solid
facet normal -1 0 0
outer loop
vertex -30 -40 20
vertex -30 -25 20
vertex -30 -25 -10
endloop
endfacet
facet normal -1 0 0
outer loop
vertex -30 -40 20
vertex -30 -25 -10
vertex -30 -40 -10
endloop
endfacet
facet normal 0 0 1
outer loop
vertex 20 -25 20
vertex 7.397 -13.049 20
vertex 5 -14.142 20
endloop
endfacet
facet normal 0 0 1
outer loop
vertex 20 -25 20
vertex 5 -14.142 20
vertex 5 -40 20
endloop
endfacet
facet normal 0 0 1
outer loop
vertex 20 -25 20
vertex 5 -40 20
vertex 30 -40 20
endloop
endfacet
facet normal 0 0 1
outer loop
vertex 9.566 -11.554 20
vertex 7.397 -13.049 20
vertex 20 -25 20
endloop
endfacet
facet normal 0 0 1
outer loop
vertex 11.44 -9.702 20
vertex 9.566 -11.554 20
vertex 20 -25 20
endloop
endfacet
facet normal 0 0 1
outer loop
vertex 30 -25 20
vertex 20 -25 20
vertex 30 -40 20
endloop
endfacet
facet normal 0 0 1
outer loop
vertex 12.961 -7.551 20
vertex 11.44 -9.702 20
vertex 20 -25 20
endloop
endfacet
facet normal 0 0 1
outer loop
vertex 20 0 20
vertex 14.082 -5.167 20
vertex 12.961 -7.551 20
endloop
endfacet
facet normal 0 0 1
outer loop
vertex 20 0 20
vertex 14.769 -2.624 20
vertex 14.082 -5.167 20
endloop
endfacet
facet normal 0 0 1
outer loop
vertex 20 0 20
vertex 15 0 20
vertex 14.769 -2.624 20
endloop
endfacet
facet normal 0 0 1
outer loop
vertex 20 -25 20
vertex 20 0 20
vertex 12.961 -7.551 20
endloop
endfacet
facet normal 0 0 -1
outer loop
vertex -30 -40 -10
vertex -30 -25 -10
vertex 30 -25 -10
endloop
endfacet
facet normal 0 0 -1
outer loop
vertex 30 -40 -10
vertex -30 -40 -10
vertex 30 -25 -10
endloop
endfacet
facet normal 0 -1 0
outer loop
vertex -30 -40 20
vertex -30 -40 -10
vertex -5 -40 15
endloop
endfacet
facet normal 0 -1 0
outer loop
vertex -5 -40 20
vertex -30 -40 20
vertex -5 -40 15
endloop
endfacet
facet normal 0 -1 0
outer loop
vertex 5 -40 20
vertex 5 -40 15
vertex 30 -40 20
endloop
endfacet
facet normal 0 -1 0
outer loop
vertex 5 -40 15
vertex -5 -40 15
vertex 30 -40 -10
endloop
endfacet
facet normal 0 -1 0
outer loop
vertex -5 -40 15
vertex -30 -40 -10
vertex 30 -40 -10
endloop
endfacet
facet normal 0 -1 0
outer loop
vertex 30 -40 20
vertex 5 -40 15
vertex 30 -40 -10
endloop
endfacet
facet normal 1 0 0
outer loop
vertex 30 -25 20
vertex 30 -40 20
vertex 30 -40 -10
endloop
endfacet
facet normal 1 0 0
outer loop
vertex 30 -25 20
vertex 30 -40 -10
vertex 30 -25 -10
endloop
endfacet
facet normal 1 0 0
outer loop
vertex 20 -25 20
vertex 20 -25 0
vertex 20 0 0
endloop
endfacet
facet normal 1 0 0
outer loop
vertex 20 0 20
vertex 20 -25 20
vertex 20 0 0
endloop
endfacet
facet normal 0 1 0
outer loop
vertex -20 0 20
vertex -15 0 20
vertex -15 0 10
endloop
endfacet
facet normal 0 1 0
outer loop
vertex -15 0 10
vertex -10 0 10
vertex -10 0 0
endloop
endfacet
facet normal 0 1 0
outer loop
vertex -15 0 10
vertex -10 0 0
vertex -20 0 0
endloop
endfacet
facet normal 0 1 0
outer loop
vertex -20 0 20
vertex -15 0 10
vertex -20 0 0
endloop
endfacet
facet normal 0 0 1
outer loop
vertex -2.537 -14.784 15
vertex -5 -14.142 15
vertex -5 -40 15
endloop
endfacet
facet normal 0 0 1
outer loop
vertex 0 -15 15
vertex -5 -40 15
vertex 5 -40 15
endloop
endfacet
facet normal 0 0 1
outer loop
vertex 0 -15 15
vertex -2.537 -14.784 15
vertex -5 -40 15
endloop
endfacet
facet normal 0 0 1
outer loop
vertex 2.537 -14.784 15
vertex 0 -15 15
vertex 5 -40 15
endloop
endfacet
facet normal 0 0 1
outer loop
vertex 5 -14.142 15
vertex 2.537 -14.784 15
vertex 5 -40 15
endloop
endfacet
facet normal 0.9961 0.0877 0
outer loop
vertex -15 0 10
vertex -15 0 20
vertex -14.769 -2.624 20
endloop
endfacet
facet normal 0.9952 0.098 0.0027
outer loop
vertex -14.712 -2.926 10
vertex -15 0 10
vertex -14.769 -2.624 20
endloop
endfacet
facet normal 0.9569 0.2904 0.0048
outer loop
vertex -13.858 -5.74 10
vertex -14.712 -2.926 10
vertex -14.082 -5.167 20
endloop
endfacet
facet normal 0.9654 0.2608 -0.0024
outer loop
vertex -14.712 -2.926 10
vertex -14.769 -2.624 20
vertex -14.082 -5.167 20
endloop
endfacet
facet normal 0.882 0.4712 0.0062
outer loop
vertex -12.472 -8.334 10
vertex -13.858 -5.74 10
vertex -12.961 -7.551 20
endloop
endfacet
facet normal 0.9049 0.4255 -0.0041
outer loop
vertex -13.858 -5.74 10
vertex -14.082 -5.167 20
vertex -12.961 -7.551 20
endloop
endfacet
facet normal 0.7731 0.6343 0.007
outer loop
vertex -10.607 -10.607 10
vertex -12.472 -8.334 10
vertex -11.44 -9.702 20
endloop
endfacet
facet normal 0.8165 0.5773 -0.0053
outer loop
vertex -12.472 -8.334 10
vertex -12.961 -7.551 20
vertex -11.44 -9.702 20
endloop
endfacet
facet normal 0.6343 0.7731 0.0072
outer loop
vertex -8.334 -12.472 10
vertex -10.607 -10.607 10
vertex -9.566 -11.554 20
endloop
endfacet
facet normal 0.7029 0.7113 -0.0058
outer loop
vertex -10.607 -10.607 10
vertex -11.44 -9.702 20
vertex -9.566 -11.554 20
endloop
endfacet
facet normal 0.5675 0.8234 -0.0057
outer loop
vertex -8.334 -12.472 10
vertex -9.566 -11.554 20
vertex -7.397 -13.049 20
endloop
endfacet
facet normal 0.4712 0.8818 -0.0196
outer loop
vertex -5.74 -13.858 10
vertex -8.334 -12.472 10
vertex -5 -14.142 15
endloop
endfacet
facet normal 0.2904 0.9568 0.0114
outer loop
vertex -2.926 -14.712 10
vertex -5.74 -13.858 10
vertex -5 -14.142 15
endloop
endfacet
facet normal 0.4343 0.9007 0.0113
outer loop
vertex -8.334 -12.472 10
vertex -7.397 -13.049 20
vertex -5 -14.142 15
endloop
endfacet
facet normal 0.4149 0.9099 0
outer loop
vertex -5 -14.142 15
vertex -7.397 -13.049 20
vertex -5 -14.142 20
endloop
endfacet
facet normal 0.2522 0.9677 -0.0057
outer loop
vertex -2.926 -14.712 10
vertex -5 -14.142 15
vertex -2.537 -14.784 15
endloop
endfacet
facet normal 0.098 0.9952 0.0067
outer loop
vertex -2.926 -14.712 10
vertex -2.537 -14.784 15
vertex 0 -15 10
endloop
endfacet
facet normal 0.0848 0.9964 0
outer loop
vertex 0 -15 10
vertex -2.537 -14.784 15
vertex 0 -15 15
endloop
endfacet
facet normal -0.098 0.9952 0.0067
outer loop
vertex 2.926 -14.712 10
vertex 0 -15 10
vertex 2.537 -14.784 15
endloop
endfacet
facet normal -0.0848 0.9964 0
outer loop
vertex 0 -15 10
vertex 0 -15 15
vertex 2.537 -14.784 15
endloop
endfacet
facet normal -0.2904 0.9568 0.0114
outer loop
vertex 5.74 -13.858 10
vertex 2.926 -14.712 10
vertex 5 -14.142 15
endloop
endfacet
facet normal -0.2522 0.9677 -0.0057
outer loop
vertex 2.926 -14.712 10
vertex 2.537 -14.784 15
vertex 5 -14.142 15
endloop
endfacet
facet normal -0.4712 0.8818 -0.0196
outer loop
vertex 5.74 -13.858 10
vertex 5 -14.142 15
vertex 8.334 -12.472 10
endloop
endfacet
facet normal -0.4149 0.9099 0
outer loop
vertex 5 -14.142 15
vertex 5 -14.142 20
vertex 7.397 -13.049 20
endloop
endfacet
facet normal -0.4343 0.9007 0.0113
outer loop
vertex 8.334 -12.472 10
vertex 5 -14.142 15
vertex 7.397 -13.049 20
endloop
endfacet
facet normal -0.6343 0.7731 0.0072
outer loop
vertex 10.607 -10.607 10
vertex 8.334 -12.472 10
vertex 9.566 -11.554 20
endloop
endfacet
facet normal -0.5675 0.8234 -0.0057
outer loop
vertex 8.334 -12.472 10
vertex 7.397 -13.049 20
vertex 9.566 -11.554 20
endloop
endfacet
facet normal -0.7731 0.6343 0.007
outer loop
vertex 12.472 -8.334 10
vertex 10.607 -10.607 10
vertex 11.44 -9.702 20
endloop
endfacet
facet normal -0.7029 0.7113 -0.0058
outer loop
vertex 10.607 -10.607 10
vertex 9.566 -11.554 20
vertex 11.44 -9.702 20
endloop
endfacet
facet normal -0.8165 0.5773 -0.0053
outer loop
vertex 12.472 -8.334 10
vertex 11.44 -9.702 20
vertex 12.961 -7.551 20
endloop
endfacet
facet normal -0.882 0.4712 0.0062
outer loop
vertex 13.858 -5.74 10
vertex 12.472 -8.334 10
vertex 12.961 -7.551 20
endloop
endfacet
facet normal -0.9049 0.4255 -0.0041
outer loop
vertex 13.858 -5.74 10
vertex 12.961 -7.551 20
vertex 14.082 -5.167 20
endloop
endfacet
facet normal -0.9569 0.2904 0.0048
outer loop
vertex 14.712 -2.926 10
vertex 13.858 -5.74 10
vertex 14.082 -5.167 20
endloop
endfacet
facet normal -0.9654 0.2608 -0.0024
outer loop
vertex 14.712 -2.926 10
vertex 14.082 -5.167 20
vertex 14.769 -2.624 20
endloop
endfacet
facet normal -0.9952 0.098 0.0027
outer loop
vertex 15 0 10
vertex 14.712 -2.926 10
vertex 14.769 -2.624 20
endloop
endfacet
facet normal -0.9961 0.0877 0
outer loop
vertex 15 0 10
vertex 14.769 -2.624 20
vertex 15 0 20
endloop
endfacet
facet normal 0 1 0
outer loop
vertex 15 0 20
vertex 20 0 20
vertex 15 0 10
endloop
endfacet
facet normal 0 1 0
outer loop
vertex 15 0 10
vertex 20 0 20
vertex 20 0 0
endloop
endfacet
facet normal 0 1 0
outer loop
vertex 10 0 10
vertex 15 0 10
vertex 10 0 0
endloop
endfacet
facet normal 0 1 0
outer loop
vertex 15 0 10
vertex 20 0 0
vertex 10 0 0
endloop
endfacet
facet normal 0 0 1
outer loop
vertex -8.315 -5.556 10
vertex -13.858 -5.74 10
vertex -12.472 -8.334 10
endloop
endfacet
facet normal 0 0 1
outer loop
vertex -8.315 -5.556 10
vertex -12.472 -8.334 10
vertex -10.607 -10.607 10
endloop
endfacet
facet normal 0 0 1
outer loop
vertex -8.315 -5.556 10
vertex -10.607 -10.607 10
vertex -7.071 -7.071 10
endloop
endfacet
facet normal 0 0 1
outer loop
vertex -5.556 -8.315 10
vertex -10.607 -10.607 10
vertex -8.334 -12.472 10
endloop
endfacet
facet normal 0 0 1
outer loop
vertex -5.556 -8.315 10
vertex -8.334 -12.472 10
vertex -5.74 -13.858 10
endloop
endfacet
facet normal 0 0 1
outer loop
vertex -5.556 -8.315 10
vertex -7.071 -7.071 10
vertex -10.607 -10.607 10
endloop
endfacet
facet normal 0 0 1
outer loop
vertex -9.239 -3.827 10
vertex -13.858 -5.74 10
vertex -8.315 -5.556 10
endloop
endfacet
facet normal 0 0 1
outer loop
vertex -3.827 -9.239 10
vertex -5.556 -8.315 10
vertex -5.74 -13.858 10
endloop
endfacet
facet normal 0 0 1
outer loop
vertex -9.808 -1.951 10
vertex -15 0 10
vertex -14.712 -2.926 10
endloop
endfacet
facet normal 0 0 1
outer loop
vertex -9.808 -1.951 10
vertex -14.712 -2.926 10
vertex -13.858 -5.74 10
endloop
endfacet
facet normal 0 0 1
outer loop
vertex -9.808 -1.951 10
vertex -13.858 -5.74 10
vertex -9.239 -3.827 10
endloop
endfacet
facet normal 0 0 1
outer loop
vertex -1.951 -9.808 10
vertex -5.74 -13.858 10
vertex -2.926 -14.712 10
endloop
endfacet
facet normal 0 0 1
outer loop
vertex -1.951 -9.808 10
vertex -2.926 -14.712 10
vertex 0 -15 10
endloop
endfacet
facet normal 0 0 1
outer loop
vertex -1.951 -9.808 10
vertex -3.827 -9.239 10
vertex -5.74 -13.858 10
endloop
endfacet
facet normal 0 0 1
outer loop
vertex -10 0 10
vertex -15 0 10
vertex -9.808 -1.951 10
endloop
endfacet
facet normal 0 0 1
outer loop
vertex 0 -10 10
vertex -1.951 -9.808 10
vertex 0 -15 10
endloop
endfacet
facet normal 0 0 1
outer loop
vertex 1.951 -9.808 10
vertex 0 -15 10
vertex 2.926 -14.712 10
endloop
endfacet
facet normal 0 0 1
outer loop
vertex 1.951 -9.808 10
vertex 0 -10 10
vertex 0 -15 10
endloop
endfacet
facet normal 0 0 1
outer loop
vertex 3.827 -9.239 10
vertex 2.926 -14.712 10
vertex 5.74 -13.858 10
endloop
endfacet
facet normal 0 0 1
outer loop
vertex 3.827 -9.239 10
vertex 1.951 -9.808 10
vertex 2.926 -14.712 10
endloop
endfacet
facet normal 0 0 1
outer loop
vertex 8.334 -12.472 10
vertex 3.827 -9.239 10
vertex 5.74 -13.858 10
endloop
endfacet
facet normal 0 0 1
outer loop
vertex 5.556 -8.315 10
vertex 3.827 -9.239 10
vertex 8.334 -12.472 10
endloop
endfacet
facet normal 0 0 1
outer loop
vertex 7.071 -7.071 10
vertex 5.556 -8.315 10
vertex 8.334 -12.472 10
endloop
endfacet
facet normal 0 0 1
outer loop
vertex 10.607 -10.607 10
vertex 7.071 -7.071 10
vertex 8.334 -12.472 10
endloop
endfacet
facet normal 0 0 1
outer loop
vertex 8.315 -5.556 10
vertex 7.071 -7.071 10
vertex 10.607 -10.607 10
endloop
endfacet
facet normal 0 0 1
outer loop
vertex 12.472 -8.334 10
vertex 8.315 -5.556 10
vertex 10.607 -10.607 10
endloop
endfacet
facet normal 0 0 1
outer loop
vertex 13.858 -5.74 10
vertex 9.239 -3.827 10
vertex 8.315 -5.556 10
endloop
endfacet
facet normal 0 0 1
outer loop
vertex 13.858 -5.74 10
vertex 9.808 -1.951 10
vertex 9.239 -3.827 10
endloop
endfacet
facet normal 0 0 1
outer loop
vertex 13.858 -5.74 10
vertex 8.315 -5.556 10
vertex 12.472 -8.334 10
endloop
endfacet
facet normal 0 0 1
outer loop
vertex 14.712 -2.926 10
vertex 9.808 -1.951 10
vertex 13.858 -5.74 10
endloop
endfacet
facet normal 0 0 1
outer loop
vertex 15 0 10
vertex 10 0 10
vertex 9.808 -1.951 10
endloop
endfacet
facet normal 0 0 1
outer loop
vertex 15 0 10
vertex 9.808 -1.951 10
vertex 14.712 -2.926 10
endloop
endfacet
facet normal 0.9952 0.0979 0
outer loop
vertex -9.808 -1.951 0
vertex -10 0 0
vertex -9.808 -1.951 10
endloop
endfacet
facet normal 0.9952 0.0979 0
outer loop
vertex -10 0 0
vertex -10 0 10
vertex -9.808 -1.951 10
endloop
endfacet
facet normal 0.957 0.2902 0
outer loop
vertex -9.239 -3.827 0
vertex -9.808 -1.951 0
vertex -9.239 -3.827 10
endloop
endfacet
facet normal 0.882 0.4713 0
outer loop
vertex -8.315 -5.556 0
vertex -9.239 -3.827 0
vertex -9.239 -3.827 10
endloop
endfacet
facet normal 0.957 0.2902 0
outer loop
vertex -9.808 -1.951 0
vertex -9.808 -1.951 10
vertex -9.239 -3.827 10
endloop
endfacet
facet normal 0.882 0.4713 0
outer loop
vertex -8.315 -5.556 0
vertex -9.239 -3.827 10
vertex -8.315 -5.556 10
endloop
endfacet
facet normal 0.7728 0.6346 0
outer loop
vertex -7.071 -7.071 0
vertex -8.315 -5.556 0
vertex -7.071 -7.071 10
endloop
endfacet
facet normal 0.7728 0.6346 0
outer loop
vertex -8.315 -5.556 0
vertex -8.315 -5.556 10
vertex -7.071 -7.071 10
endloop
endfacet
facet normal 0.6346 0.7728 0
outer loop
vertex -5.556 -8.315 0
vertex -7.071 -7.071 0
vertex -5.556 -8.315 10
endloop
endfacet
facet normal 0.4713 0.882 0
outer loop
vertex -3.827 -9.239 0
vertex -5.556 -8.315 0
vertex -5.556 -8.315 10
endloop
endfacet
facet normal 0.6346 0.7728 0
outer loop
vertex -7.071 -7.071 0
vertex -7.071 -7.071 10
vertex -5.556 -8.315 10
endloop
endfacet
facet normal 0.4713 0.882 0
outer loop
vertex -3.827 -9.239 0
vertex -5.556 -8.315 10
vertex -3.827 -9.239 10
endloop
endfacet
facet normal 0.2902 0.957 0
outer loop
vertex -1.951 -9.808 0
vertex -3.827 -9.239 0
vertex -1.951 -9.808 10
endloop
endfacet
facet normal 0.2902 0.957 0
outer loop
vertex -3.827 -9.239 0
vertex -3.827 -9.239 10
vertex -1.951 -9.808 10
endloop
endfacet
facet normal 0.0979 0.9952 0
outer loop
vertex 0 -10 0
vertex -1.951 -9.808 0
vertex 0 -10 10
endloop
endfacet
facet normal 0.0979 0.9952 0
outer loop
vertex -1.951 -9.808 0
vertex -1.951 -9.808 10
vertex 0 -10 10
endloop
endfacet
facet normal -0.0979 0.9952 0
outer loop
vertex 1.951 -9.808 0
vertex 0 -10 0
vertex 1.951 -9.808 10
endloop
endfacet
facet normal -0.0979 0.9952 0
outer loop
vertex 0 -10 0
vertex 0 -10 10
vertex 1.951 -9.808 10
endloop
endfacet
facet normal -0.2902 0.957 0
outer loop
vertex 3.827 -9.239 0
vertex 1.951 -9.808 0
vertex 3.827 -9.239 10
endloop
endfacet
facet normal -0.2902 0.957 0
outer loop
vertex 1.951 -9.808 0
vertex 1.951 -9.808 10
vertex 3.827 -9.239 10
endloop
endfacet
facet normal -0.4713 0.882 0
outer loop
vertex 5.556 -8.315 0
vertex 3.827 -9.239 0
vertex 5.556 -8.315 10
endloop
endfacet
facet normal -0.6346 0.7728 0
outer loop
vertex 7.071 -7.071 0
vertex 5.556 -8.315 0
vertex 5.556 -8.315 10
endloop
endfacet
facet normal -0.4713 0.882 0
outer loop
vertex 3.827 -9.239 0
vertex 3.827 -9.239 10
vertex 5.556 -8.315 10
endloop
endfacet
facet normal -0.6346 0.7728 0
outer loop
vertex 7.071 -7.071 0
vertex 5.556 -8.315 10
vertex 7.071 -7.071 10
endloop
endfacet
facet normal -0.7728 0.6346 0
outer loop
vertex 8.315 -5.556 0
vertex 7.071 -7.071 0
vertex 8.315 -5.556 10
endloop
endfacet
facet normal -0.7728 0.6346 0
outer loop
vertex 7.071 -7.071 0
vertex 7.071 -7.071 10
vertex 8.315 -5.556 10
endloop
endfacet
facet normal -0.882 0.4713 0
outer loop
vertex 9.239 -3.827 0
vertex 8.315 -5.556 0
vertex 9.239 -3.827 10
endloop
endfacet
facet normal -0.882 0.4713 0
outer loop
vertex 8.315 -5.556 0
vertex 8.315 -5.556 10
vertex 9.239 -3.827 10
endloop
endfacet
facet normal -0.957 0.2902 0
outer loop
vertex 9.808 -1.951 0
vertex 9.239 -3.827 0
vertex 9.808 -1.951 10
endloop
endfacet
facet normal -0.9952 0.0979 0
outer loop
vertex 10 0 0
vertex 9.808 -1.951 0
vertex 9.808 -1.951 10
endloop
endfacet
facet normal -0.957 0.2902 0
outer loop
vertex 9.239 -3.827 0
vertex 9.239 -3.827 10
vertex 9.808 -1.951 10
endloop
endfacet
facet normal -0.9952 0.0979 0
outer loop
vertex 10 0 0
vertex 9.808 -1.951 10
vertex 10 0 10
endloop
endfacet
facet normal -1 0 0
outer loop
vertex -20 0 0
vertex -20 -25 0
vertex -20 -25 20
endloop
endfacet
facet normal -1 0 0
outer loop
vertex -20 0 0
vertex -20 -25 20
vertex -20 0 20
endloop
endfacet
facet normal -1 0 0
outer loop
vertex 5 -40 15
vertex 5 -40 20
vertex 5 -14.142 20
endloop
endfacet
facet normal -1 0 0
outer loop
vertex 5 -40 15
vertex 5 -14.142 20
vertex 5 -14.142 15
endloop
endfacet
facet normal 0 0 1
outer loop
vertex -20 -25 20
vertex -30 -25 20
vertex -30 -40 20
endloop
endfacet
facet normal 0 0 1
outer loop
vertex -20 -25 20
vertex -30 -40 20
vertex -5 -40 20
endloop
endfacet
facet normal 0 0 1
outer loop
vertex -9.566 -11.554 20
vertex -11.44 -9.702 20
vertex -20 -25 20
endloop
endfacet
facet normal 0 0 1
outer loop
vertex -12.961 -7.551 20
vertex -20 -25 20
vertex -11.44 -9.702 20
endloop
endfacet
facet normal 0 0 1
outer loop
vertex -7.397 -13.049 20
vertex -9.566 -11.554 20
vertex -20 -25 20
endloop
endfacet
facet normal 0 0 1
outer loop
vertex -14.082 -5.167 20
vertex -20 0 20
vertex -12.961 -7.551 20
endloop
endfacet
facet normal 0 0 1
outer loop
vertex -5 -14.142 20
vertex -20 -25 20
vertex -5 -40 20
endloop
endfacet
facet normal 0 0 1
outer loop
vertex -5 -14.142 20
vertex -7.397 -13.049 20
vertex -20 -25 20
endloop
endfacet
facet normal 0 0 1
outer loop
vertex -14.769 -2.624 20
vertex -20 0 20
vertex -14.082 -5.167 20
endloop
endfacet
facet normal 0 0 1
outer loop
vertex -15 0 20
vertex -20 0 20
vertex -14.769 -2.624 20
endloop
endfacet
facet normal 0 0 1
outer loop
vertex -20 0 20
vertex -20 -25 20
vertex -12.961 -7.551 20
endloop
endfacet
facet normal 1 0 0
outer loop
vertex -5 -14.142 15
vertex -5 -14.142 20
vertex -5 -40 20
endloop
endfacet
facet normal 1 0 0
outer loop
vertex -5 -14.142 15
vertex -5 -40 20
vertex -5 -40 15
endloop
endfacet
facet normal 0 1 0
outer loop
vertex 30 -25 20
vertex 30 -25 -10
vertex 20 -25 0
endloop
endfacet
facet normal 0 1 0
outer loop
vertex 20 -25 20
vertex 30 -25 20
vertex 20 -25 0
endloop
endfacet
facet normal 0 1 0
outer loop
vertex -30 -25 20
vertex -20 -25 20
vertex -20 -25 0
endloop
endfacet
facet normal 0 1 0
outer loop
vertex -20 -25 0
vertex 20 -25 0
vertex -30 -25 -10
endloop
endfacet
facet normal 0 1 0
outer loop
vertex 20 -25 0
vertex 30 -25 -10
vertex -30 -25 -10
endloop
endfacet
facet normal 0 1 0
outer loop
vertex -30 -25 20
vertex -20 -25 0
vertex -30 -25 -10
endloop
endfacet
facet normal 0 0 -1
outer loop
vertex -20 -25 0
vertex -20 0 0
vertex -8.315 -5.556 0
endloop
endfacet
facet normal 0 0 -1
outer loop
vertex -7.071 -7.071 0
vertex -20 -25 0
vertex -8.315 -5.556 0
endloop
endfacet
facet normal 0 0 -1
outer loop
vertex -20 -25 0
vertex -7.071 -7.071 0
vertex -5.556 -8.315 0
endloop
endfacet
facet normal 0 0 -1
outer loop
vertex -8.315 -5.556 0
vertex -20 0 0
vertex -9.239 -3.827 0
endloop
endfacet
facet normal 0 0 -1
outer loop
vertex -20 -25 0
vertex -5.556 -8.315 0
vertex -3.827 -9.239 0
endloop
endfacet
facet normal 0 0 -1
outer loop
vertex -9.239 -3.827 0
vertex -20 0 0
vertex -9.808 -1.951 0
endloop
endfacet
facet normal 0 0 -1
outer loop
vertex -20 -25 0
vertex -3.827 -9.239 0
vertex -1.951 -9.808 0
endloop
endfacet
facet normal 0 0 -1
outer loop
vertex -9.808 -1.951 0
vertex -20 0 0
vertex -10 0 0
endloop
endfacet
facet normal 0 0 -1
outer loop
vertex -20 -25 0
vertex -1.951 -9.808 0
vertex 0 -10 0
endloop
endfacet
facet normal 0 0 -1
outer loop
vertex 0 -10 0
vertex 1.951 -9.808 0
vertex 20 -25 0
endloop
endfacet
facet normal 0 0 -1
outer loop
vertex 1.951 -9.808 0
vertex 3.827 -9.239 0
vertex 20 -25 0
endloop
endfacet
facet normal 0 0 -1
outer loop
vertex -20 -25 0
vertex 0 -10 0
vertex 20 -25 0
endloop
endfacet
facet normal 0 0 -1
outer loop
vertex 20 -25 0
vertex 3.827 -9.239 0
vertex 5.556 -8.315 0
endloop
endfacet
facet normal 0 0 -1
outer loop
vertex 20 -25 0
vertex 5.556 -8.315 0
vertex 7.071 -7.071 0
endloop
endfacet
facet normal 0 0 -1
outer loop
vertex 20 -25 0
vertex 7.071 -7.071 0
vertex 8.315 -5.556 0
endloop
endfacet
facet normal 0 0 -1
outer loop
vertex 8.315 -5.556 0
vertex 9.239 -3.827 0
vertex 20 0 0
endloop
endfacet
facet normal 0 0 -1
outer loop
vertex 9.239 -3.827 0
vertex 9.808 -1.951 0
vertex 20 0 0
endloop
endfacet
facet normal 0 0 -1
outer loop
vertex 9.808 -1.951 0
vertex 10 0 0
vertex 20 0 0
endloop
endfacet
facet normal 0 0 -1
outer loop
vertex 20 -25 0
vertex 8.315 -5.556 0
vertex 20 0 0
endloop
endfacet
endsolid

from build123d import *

# Parameters (mm, degrees)
SKETCH1_W                = 40
SKETCH1_H                = 25
BOSS_EXTRUDE1_DEPTH      = 20
BOSS_EXTRUDE2_DEPTH      = 20
BOSS_EXTRUDE2_DEPTH_BACK = 10
SKETCH2_R                = 10
CUT_EXTRUDE1_DEPTH       = 59.309518948
SKETCH3_W                = 10
SKETCH3_H                = 5
CUT_EXTRUDE2_DEPTH       = 54.851648071
SKETCH4_R                = 15
CUT_EXTRUDE3_DEPTH       = 10


with BuildPart() as part:
    # Sketch1 → Boss-Extrude1 (new body)
    with BuildSketch(Plane.XY):
        with Locations((0, -12.5)):
            Rectangle(SKETCH1_W, SKETCH1_H)
    extrude(amount=BOSS_EXTRUDE1_DEPTH)

    # Sketch1<3> → Boss-Extrude2 (add, two sides: drawn at the far end of the back side and taken through both)
    with BuildSketch(Plane.XY.offset(-BOSS_EXTRUDE2_DEPTH_BACK)):
        Polygon((20, -25), (-20, -25), (-30, -25), (-30, -40), (30, -40), (30, -25), align=None)
    extrude(amount=BOSS_EXTRUDE2_DEPTH + BOSS_EXTRUDE2_DEPTH_BACK)

    # Sketch2 → Cut-Extrude1 (cut, through all)
    with BuildSketch(Plane.XY.offset(20)):
        Circle(SKETCH2_R)
    extrude(amount=-CUT_EXTRUDE1_DEPTH, mode=Mode.SUBTRACT)

    # Sketch3 → Cut-Extrude2 (cut, through all)
    with BuildSketch(Plane(origin=(0, 0, 0), x_dir=(1, 0, 0), z_dir=(0, 1, 0))):
        with Locations((0, -17.5)):
            Rectangle(SKETCH3_W, SKETCH3_H)
    extrude(amount=-CUT_EXTRUDE2_DEPTH, mode=Mode.SUBTRACT)

    # Sketch4 → Cut-Extrude3 (cut)
    with BuildSketch(Plane.XY.offset(20)):
        Circle(SKETCH4_R)
    extrude(amount=-CUT_EXTRUDE3_DEPTH, mode=Mode.SUBTRACT)


solid = part.part
